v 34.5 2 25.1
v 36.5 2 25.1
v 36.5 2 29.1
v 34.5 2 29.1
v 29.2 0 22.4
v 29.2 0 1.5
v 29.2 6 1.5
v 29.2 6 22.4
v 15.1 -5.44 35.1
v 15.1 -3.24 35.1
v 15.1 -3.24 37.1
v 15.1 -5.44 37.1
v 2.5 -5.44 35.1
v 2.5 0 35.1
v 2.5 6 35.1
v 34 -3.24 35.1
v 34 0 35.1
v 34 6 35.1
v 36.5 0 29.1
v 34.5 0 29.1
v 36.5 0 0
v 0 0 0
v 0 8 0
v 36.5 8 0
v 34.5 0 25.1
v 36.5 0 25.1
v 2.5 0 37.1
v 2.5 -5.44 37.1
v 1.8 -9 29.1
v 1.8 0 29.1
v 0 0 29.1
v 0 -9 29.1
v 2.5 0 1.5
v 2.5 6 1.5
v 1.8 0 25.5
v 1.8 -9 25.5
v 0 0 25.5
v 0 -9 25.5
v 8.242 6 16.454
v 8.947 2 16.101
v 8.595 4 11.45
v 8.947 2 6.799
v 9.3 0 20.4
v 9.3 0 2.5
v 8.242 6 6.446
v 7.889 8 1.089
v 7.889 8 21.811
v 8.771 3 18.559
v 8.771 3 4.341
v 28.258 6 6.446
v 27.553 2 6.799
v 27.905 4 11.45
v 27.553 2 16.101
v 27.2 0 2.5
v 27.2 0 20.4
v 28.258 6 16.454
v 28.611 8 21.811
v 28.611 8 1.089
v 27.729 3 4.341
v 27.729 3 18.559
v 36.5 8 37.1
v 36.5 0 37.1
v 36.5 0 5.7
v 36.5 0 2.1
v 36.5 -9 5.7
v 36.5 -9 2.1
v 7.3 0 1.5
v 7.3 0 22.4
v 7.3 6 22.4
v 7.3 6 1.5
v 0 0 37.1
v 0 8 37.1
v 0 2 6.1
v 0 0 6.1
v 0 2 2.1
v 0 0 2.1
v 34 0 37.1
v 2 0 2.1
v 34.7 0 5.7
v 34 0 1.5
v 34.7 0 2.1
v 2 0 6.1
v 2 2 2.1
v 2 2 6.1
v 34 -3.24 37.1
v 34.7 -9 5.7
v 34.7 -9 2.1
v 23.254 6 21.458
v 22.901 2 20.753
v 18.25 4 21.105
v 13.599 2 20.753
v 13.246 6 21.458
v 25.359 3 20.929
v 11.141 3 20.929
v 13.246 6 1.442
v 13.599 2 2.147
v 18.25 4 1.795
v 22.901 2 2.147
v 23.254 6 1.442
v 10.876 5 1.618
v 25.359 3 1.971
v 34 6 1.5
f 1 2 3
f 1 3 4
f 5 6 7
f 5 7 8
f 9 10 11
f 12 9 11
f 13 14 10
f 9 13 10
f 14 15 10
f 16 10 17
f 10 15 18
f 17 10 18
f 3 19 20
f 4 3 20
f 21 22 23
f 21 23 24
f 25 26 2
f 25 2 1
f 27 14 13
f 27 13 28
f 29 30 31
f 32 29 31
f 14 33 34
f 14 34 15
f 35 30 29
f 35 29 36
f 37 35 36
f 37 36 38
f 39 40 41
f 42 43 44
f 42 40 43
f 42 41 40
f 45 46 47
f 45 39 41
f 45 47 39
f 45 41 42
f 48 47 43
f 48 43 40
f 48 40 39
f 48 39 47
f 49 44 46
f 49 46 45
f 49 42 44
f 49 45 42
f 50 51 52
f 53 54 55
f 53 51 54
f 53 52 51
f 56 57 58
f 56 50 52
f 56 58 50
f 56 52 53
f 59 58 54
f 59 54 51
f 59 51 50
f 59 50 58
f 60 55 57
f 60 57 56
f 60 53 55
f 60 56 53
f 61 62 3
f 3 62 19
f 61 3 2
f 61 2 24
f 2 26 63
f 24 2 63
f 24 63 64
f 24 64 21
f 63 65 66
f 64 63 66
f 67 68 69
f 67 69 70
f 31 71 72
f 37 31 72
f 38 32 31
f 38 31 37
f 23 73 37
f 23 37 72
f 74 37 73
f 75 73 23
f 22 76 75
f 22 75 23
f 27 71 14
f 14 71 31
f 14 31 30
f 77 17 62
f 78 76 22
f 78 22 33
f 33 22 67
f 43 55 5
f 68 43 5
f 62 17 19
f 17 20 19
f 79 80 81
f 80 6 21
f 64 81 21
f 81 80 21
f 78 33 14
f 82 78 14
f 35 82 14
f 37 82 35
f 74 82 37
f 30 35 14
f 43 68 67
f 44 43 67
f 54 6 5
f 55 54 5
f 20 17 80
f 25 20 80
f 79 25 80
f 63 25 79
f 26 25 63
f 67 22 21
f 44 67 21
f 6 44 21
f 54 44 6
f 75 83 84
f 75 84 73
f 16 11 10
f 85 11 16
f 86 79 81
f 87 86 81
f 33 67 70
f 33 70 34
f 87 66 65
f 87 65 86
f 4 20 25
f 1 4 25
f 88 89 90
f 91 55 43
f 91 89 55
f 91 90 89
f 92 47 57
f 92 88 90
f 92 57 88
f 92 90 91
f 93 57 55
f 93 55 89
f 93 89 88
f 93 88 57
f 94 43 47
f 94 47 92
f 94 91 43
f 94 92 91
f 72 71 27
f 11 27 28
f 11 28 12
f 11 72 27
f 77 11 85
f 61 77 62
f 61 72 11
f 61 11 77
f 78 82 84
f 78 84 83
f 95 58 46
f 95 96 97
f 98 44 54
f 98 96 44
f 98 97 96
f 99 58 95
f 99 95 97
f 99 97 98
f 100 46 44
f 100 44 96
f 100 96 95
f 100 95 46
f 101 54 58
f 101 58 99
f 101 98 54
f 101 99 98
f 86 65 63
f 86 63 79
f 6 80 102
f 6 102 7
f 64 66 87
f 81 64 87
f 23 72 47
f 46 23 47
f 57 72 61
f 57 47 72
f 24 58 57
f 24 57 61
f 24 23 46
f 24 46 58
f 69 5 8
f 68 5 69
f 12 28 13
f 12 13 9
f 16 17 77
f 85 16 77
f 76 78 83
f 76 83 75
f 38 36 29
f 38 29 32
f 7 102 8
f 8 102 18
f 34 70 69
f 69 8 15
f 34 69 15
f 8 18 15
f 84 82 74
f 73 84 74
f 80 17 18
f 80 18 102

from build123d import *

# Parameters (mm, degrees)
SKETCH1_W          = 36.5
SKETCH1_H          = 37.1
BODY_DEPTH         = 8
SKETCH2_W          = 2
SKETCH2_H          = 4
FEMALE_TABS_DEPTH  = 2
SKETCH3_W          = 1.8
SKETCH3_H          = 3.6
MALE_TABS_DEPTH    = 9
SKETCH5_W          = 17.9
SKETCH5_H          = 17.9
SIPM_WINDOW_DEPTH  = 8
SIPM_WINDOW_TAPER  = -10
CUT_EXTRUDE2_DEPTH = 6
SKETCH7_W          = 18.9
SKETCH7_H          = 2
RIGHT_DROP_DEPTH   = 3.24
SKETCH8_W          = 12.6
SKETCH8_H          = 2
LEFT_DROP_DEPTH    = 5.44


with BuildPart() as part:
    # Sketch1 → Body (new body)
    with BuildSketch(Plane(origin=(0, 0, 0), x_dir=(1, 0, 0), z_dir=(0, 1, 0))):
        with Locations((18.25, -18.55)):
            Rectangle(SKETCH1_W, SKETCH1_H)
    extrude(amount=BODY_DEPTH)

    # Sketch2 → Female Tabs (cut)
    with BuildSketch(Plane(origin=(0, 0, 0), x_dir=(-1, 0, 0), z_dir=(0, -1, 0))):
        with Locations((-1, -4.1)):
            Rectangle(SKETCH2_W, SKETCH2_H)
        with Locations((-35.5, -27.1)):
            Rectangle(SKETCH2_W, SKETCH2_H)
    extrude(amount=-FEMALE_TABS_DEPTH, mode=Mode.SUBTRACT)

    # Sketch3 → Male Tabs (add)
    with BuildSketch(Plane(origin=(0, 0, 0), x_dir=(-1, 0, 0), z_dir=(0, -1, 0))):
        with Locations((-0.9, -27.3)):
            Rectangle(SKETCH3_W, SKETCH3_H)
        with Locations((-35.6, -3.9)):
            Rectangle(SKETCH3_W, SKETCH3_H)
    extrude(amount=MALE_TABS_DEPTH)

    # Sketch5 → SiPM Window (cut)
    with BuildSketch(Plane(origin=(0, 0, 0), x_dir=(-1, 0, 0), z_dir=(0, -1, 0))):
        with Locations((-18.25, -11.45)):
            Rectangle(SKETCH5_W, SKETCH5_H)
    extrude(amount=-SIPM_WINDOW_DEPTH, taper=SIPM_WINDOW_TAPER, mode=Mode.SUBTRACT)

    # Sketch6 → Cut-Extrude2 (cut)
    with BuildSketch(Plane.XZ):
        Polygon((34, 1.5), (29.2, 1.5), (29.2, 22.4), (7.3, 22.4), (7.3, 1.5), (2.5, 1.5), (2.5, 35.1), (34, 35.1), align=None)
    extrude(amount=-CUT_EXTRUDE2_DEPTH, mode=Mode.SUBTRACT)

    # Sketch7 → Right Drop (add)
    with BuildSketch(Plane.XZ):
        with Locations((24.55, 36.1)):
            Rectangle(SKETCH7_W, SKETCH7_H)
    extrude(amount=RIGHT_DROP_DEPTH)

    # Sketch8 → Left Drop (add)
    with BuildSketch(Plane.XZ):
        with Locations((8.8, 36.1)):
            Rectangle(SKETCH8_W, SKETCH8_H)
    extrude(amount=LEFT_DROP_DEPTH)


solid = part.part
